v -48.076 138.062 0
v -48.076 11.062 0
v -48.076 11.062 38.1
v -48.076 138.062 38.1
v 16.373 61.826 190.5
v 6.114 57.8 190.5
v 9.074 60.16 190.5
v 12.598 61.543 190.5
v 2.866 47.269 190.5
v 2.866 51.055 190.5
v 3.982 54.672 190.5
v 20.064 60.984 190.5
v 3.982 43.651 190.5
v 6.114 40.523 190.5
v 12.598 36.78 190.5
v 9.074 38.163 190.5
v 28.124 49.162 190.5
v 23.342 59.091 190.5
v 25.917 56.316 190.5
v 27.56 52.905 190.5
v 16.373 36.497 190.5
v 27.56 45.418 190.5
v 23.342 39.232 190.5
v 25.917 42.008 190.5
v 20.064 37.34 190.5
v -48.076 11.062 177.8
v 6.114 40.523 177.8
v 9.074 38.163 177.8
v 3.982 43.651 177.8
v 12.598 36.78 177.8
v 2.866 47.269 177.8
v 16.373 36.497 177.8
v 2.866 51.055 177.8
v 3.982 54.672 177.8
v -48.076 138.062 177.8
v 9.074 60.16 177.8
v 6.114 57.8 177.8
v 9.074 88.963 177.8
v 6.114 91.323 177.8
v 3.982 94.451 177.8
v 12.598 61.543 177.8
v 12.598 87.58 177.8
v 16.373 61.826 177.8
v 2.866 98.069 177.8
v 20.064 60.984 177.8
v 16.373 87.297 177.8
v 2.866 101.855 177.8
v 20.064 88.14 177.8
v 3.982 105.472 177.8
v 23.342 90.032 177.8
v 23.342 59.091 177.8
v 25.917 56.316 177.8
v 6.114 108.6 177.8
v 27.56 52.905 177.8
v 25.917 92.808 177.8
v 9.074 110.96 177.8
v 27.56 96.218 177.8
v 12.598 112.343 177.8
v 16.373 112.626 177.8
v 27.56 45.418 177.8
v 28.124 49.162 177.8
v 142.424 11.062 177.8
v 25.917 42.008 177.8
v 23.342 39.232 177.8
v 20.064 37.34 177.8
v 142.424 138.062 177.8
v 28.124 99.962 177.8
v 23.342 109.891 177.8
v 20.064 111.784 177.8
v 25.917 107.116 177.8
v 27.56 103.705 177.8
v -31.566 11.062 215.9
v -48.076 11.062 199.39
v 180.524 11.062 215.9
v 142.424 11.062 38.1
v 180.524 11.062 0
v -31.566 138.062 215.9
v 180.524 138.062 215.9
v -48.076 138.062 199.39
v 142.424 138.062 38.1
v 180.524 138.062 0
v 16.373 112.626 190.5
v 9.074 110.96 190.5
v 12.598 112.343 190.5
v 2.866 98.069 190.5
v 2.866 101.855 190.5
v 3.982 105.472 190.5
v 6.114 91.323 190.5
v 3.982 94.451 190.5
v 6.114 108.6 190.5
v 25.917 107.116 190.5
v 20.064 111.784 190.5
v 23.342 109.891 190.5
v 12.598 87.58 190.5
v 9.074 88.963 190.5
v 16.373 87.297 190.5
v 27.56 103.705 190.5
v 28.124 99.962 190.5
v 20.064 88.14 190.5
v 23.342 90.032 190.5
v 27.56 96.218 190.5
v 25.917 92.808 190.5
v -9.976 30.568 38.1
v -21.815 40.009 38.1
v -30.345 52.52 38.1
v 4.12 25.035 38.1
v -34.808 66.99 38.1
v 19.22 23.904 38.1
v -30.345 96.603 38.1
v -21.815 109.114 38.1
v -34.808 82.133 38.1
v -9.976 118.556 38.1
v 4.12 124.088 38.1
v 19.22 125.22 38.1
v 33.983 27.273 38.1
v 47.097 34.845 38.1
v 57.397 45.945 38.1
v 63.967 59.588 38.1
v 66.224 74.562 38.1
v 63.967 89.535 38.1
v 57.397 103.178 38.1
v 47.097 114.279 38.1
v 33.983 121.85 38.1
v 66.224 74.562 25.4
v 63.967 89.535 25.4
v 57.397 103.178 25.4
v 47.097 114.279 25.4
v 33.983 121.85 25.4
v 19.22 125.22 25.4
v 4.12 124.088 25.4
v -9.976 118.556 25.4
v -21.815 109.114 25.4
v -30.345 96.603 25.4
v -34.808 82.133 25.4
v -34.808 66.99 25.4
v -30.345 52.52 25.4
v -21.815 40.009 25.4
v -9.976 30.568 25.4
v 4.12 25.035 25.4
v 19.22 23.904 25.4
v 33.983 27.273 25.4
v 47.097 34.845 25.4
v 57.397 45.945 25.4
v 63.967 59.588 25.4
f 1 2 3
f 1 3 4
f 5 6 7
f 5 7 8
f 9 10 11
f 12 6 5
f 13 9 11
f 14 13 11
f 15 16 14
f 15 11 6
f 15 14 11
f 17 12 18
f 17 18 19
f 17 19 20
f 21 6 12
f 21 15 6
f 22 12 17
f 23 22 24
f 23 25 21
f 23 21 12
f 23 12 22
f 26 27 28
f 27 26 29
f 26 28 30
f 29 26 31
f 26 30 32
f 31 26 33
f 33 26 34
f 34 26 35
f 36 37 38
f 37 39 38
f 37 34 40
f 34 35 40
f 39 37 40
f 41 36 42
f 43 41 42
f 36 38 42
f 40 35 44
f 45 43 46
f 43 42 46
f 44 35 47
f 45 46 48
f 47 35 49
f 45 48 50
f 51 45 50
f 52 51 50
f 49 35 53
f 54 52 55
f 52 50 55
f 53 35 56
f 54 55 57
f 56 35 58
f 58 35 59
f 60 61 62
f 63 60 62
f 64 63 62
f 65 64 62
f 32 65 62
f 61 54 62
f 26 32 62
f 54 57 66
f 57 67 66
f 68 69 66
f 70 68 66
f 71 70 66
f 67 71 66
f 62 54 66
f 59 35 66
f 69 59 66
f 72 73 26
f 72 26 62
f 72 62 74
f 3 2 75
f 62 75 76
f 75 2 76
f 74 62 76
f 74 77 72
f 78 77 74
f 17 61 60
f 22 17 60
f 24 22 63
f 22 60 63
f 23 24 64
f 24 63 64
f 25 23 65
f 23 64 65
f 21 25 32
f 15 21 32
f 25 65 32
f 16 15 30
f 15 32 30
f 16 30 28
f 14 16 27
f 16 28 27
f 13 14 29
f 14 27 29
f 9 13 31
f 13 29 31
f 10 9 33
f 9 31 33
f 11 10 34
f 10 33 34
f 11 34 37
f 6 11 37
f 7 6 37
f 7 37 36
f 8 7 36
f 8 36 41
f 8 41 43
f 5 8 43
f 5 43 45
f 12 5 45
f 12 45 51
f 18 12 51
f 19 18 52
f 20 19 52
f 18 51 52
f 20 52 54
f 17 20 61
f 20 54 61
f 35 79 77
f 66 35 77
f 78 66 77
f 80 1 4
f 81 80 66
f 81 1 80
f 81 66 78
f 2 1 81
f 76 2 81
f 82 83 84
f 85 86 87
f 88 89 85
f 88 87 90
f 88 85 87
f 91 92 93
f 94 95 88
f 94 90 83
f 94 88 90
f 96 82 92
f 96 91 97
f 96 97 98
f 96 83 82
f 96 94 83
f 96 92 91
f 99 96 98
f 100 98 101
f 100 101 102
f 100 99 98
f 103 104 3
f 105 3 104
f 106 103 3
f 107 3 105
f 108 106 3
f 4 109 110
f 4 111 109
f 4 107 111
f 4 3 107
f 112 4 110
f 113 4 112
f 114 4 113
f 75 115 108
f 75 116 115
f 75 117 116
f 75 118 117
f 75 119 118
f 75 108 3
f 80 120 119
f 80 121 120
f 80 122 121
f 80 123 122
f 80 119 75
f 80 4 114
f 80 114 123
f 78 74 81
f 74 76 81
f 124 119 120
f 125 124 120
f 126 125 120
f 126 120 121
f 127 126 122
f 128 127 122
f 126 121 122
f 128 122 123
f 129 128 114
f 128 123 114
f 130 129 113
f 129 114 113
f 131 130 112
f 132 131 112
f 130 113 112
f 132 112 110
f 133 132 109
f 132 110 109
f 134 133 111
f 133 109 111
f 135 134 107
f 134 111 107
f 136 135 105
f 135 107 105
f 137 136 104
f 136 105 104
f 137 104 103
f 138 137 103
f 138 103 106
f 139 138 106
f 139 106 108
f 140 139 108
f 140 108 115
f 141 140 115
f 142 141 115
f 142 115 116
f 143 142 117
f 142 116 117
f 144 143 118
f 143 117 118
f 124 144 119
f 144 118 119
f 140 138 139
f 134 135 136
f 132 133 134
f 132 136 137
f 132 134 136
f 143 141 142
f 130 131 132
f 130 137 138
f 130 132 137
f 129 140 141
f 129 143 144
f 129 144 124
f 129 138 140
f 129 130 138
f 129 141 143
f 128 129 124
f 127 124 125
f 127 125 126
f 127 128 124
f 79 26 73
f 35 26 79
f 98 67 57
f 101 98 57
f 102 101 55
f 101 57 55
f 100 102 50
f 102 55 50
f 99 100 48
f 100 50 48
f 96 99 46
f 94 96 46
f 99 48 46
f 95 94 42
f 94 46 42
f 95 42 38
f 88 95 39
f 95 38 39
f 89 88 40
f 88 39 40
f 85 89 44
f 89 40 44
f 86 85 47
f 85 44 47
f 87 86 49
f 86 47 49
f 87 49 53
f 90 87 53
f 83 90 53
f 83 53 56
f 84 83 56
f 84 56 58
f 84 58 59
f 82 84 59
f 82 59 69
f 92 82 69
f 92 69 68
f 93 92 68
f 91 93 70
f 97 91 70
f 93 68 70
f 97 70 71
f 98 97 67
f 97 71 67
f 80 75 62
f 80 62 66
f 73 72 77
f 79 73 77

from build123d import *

# Parameters (mm, degrees)
F0_W      = 228.6
F0_H      = 127
F1_DEPTH  = 38.1
F2_W      = 38.1
F2_H      = 127
F3_DEPTH  = 139.7
F4_W      = 228.6
F4_H      = 127
F5_DEPTH  = 38.1
F6_SIZE   = 16.51
F7_R      = 12.7
F8_DEPTH  = 12.7
F9_DEPTH  = 12.7
F10_R     = 50.8
F11_DEPTH = 12.7


with BuildPart() as f1:
    # F0 (on Top) → F1 (new body)
    with BuildSketch(Plane.XY):
        with Locations((66.2241340283, 74.5616891205)):
            Rectangle(F0_W, F0_H)
    extrude(amount=F1_DEPTH)

    # F2 (on face) → F3 (join)
    with BuildSketch(Plane.XY.offset(38.1)):
        with Locations((161.4741340283, 74.5616891205)):
            Rectangle(F2_W, F2_H)
    extrude(amount=F3_DEPTH)

    # F4 (on face) → F5 (join)
    with BuildSketch(Plane.XY.offset(177.8)):
        with Locations((66.2241340283, 74.5616891205)):
            Rectangle(F4_W, F4_H)
    extrude(amount=F5_DEPTH)

    # F6
    f6_edges = [f1.edges().sort_by_distance(p)[0] for p in [
        (-48.075866, 74.561689, 215.9),
    ]]
    chamfer(f6_edges, length=F6_SIZE)

    # F7 (on face) → F8 (cut)
    with BuildSketch(Plane(origin=(0, 0, 177.8), x_dir=(1, 0, 0), z_dir=(0, 0, -1))):
        with Locations((15.4241340283, -99.9616891205)):
            Circle(F7_R)
    extrude(amount=-F8_DEPTH, mode=Mode.SUBTRACT)

    # F7 (on face) → F9 (cut)
    with BuildSketch(Plane(origin=(0, 0, 177.8), x_dir=(1, 0, 0), z_dir=(0, 0, -1))):
        with Locations((15.4241340283, -49.1616891205)):
            Circle(F7_R)
    extrude(amount=-F9_DEPTH, mode=Mode.SUBTRACT)

    # F10 (on face) → F11 (cut)
    with BuildSketch(Plane.XY.offset(38.1)):
        with Locations((15.4241340283, 74.5616891205)):
            Circle(F10_R)
    extrude(amount=-F11_DEPTH, mode=Mode.SUBTRACT)


solid = f1.part
